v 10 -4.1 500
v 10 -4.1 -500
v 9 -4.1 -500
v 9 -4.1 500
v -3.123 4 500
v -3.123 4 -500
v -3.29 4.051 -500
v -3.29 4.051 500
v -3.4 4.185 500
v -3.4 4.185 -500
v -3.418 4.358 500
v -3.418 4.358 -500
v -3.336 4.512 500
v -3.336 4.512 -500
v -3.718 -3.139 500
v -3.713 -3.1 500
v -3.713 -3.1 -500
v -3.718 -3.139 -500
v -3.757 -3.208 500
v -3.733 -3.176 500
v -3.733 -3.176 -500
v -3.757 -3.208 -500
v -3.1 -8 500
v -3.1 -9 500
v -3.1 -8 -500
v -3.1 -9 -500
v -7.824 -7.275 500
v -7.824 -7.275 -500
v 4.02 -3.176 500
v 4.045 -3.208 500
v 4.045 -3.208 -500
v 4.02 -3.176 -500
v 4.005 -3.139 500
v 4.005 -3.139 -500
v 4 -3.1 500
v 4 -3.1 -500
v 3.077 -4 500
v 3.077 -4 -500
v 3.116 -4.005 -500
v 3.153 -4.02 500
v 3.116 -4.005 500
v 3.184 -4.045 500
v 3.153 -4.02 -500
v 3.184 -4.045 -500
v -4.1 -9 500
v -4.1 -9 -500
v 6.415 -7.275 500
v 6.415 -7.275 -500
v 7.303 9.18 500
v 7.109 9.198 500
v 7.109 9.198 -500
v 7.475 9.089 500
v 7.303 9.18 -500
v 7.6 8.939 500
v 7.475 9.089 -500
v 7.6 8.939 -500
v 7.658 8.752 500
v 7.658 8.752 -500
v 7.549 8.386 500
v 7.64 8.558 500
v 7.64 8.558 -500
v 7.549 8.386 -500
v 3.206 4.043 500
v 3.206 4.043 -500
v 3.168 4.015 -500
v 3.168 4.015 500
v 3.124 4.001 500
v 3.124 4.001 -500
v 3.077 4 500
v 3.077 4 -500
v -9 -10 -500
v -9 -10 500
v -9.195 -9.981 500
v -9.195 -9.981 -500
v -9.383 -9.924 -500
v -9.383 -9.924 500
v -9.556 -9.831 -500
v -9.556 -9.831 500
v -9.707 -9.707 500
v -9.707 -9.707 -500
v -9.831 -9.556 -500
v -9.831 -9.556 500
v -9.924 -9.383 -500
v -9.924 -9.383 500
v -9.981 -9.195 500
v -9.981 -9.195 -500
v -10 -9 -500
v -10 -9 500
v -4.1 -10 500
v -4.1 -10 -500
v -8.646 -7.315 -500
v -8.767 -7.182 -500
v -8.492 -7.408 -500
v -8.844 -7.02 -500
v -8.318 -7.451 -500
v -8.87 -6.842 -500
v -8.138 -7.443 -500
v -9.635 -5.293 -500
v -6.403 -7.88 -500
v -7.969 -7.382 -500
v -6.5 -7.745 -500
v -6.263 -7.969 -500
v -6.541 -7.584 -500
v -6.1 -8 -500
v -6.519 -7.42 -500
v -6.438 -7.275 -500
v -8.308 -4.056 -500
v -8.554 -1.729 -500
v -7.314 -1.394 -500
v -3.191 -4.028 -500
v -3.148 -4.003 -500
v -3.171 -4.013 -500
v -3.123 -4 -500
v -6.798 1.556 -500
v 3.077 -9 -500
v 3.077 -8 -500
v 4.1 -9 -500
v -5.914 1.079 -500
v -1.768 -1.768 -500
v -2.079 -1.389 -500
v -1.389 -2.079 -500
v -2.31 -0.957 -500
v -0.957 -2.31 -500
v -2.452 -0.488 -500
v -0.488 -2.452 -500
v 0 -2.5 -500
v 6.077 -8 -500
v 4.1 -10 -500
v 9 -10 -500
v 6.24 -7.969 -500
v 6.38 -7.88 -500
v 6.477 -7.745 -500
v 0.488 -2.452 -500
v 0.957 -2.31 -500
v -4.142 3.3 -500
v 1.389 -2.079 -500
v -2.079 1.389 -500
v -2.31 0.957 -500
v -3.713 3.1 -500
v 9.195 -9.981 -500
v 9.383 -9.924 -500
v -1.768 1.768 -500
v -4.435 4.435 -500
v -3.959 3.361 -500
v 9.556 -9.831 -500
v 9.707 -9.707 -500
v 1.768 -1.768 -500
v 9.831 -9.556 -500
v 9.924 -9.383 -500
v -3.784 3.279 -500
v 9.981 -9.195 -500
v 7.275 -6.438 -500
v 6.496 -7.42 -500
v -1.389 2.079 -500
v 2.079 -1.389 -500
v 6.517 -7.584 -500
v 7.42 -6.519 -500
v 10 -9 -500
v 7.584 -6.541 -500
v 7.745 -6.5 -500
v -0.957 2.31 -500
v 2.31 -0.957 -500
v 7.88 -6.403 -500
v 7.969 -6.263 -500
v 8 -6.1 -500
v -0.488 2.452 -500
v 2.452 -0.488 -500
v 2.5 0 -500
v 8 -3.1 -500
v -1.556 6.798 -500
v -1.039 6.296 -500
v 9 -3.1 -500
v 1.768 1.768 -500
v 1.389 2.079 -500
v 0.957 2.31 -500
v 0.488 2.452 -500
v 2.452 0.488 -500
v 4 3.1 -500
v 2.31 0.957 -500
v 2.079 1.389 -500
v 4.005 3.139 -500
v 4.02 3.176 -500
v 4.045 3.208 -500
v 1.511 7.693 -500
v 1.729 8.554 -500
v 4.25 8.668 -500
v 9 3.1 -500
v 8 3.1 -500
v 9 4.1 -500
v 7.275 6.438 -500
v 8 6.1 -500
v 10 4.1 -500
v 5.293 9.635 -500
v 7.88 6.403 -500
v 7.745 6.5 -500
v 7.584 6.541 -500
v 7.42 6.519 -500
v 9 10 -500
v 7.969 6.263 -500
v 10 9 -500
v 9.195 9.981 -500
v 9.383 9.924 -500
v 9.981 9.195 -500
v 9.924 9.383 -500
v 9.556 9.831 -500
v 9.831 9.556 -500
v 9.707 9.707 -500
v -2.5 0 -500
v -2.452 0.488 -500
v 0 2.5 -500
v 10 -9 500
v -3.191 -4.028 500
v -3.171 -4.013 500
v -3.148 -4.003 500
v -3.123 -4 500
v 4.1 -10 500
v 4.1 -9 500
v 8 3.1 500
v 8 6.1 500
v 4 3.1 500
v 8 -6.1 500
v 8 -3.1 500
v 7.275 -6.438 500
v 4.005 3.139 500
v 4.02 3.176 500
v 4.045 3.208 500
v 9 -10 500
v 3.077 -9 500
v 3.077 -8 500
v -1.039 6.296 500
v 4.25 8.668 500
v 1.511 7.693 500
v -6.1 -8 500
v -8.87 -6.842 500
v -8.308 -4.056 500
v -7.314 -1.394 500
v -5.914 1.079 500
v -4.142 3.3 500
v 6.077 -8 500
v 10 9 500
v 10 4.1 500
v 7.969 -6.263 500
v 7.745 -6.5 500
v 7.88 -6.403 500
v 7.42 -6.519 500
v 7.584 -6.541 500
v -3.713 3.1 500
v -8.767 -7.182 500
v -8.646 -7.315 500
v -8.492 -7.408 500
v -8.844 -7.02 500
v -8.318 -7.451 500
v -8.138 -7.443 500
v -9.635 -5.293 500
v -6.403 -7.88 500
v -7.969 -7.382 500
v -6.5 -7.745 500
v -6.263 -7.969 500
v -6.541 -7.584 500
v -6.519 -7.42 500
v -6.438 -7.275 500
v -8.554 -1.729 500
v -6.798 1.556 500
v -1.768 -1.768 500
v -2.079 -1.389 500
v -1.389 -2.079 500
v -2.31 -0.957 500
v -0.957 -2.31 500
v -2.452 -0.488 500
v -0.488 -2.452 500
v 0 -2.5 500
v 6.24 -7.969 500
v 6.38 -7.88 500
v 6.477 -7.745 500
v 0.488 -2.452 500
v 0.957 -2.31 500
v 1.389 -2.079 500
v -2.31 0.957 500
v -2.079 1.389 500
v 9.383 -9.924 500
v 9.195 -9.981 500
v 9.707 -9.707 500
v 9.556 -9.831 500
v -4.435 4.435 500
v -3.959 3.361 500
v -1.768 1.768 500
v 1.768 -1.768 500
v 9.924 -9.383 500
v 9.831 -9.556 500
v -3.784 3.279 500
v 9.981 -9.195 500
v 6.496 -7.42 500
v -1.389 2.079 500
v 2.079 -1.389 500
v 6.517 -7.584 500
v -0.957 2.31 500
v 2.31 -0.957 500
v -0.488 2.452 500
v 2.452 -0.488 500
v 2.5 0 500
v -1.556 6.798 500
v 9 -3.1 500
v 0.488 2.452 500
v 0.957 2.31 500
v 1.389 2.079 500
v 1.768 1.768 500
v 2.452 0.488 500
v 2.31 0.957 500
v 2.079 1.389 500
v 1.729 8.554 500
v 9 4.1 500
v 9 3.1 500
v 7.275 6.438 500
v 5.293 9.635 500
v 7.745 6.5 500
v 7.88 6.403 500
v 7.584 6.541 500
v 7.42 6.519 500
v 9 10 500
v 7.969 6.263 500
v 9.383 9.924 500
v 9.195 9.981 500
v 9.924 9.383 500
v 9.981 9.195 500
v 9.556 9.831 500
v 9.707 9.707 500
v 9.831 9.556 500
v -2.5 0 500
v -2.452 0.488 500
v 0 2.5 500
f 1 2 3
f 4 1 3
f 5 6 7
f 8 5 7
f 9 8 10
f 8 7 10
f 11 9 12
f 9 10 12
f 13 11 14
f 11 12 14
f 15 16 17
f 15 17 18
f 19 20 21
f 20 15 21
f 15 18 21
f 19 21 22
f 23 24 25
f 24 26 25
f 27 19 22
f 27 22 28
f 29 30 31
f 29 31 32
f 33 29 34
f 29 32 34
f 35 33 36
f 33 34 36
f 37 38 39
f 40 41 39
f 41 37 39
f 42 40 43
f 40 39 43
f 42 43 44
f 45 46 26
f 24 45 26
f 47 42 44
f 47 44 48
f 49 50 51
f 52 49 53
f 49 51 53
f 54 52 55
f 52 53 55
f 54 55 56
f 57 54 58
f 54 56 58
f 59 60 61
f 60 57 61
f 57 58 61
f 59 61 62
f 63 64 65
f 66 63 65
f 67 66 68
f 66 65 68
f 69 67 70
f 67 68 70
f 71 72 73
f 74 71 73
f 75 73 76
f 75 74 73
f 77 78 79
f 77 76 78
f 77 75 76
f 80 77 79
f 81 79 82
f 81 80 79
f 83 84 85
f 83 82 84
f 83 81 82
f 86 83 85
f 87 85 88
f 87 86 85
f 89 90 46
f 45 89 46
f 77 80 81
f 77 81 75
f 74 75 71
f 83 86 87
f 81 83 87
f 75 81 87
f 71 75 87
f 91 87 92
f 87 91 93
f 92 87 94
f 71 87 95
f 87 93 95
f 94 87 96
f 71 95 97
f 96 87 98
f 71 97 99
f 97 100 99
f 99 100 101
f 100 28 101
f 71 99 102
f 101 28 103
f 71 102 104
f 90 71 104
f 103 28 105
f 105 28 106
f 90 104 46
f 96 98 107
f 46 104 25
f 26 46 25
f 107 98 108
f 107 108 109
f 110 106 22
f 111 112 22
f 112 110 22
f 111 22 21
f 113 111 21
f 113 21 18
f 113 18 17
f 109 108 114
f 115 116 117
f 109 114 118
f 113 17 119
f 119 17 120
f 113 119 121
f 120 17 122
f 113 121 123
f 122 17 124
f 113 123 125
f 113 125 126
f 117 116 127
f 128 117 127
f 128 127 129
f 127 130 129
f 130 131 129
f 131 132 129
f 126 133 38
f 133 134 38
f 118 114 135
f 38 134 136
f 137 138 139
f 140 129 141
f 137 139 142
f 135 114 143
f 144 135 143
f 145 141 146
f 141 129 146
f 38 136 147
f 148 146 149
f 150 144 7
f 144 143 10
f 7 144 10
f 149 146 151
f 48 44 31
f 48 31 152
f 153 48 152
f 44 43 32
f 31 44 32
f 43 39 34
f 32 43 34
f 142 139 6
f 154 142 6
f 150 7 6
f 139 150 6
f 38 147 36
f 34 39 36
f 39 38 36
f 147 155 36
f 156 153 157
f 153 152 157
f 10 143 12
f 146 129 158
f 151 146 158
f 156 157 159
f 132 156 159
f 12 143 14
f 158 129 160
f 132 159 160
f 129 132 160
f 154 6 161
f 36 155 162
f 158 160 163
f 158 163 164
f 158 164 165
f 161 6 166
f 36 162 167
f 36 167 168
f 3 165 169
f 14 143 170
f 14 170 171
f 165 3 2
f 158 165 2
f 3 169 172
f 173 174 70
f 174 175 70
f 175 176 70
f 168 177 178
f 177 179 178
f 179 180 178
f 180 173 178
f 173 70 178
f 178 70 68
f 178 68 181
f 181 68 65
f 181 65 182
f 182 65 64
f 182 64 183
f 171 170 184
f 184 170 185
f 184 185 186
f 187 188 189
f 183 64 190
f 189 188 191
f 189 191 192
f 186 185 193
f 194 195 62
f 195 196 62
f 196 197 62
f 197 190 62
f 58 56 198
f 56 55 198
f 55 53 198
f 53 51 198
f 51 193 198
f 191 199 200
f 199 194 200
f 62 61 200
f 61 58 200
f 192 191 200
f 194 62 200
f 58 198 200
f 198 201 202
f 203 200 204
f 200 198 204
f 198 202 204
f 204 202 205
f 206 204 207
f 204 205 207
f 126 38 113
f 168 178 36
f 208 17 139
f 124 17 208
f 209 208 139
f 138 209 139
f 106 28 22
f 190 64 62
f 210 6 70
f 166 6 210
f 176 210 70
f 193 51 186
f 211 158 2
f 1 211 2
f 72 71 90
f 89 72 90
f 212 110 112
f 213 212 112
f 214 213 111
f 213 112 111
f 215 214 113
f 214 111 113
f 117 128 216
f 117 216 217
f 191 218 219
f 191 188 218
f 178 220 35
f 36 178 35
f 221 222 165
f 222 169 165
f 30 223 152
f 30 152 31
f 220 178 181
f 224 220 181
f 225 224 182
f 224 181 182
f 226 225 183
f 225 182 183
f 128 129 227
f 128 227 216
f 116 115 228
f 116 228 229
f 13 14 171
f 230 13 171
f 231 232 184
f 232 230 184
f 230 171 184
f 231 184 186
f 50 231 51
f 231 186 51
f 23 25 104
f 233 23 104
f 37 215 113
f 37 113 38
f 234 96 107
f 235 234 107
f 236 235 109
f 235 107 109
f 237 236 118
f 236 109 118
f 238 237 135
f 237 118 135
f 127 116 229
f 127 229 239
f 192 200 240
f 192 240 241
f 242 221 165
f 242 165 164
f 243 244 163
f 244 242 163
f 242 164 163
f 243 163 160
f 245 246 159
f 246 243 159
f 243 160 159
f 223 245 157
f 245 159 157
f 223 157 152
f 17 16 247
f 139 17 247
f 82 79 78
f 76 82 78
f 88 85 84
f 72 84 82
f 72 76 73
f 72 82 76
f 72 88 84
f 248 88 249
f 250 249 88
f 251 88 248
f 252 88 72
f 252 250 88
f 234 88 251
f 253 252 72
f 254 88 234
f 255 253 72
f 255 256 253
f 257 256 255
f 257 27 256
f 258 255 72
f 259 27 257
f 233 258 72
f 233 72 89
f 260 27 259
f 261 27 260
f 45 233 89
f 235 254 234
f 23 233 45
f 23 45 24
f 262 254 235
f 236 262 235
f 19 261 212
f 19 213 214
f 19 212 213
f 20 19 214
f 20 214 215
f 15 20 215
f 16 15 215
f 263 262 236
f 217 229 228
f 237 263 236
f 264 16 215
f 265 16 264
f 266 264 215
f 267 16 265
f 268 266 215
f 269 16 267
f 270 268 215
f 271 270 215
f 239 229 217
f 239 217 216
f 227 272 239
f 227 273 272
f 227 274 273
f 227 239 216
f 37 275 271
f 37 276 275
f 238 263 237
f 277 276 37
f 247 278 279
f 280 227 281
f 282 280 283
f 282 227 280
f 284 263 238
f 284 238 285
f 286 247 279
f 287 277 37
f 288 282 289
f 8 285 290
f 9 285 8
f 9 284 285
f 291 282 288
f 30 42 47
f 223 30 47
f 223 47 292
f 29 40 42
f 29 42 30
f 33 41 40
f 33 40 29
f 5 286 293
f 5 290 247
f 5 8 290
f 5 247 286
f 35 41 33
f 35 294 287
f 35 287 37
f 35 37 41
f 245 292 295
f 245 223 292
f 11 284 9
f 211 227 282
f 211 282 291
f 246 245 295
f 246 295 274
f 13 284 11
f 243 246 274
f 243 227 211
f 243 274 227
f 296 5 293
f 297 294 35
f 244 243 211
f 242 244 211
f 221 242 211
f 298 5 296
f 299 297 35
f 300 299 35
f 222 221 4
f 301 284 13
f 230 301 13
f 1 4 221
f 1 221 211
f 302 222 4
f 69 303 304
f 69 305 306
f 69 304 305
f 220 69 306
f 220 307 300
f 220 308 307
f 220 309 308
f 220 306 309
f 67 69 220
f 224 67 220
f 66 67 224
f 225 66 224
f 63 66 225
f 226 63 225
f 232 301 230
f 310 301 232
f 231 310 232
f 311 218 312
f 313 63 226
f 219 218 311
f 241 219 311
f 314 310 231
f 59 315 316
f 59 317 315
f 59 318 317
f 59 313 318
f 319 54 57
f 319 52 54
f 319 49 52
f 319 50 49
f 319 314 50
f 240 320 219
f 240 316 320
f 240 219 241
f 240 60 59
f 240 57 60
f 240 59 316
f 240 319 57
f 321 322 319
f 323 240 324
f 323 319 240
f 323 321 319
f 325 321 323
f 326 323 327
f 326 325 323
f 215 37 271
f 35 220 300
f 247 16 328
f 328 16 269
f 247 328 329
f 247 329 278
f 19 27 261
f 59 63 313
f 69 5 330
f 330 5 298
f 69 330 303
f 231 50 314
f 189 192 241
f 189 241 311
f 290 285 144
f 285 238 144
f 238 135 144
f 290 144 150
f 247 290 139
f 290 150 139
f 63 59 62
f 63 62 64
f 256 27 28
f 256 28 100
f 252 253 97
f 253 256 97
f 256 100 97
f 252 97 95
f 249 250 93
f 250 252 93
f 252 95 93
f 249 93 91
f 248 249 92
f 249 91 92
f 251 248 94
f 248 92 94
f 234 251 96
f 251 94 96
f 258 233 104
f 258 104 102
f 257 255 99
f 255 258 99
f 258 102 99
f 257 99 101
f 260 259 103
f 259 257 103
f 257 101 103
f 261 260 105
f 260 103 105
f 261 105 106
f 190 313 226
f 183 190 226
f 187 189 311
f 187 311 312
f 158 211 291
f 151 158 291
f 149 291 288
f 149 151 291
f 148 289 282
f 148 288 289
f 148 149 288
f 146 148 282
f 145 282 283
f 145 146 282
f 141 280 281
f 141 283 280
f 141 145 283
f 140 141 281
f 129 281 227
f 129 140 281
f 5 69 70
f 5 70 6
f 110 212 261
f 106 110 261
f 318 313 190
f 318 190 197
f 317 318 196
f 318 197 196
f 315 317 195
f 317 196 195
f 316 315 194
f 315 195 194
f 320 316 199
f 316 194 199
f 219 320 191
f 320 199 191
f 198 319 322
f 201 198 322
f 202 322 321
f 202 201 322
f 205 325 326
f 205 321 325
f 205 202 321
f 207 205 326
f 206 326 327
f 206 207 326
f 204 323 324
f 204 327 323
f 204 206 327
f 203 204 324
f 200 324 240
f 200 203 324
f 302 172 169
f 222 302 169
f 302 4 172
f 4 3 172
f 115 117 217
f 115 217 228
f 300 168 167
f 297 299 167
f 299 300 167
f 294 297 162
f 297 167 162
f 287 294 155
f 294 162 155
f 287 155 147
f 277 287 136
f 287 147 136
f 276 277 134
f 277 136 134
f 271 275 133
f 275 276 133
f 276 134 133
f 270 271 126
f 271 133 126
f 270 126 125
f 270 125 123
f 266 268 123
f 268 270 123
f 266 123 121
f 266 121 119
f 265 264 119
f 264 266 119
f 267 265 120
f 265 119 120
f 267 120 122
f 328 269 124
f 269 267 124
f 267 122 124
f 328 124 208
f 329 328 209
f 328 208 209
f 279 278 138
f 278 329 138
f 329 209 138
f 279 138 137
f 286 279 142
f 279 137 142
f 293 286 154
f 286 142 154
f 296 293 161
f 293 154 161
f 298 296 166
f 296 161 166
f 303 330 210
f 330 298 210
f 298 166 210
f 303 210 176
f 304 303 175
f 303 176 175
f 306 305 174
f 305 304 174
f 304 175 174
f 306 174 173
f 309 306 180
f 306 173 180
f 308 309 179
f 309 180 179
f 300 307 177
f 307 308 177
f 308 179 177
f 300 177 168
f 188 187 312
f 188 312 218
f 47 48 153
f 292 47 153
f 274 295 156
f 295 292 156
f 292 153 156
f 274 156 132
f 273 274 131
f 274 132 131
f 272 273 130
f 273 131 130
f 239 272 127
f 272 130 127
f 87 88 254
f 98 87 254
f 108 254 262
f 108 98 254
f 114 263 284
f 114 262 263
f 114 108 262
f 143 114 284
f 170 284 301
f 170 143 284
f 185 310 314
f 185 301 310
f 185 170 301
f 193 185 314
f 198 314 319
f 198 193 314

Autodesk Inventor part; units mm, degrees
ref_plane "YZ Plane" through (0, 0, 0) normal (1, 0, 0) x (0, 1, 0)
ref_plane "XZ Plane" through (0, 0, 0) normal (0, 1, 0) x (-1, 0, 0)
ref_plane "XY Plane" through (0, 0, 0) normal (0, 0, 1) x (1, 0, 0)
sketch "Esboço1" plane through (0, 0, 0) normal (0, 0, 1) x (1, 0, 0)
  line L0 (-10, 10) -> (10, 10) construction
  line L1 (10, 10) -> (10, -10) construction
  line L2 (10, -10) -> (-10, -10) construction
  line L3 (-10, -10) -> (-10, 10) construction
  line L4 (-10, 10) -> (10, -10) construction
  line L5 (10, 10) -> (-10, -10) construction
  circle A0 centre (0, 0) radius 2.5
  line L6 (10, 10) -> (1.7678, 1.7678) construction
  line L7 (1.7678, -1.7678) -> (10, -10) construction
  line L8 (-1.7678, -1.7678) -> (-10, -10) construction
  line L9 (-10, 10) -> (-1.7678, 1.7678) construction
  line L10 (4, 3.1) -> (4, -3.1) construction
  line L11 (-3.1, -5.0193) -> (3.1, -5.0193) construction
  line L12 (3.1, -5.0193) -> (10, -5.0193) construction
  line L13 (-3.1, -5.0193) -> (-10, -5.0193) construction
  line L14 (3.6312, 10) -> (10, 10) construction
  line L15 (3.6312, 10) -> (10, 10) construction
  line L16 (4, 3.1) -> (4, -3.1)
  line L17 (10, 9) -> (10, 4.1)
  line L18 (10, 4.1) -> (9, 4.1)
  line L19 (9, 4.1) -> (9, 3.1)
  line L20 (9, 3.1) -> (8, 3.1)
  line L21 (8, 3.1) -> (8, 6.1)
  arc A1 (8, 6.1) -> (7.275, 6.4381) centre (7.5586, 6.1) ccw
  line L22 (7.275, 6.4381) -> (4.0446, 3.2078)
  arc A2 (4.0446, 3.2078) -> (4, 3.1) centre (4.1524, 3.1) ccw
  line L23 (10, -9) -> (10, -4.1)
  line L24 (10, -4.1) -> (9, -4.1)
  line L25 (9, -4.1) -> (9, -3.1)
  line L26 (9, -3.1) -> (8, -3.1)
  line L27 (8, -3.1) -> (8, -6.1)
  arc A3 (7.275, -6.4381) -> (8, -6.1) centre (7.5586, -6.1) ccw
  arc A4 (4, -3.1) -> (4.0446, -3.2078) centre (4.1524, -3.1) ccw
  line L28 (7.275, -6.4381) -> (4.0446, -3.2078)
  arc A5 (9, -10) -> (10, -9) centre (9, -9) ccw
  arc A6 (10, 9) -> (9, 10) centre (9, 9) ccw
  line L29 (9, -10) -> (4.1, -10)
  line L30 (4.1, -10) -> (4.1, -9)
  line L31 (4.1, -9) -> (3.0767, -9)
  line L32 (3.0767, -9) -> (3.0767, -8)
  line L33 (3.0767, -8) -> (6.0767, -8)
  arc A7 (6.0767, -8) -> (6.4148, -7.275) centre (6.0767, -7.5586) ccw
  line L34 (-3.1233, -4) -> (3.0767, -4)
  arc A8 (3.1845, -4.0446) -> (3.0767, -4) centre (3.0767, -4.1524) ccw
  line L35 (3.1845, -4.0446) -> (6.4148, -7.275)
  arc A9 (-3.1233, -4) -> (-3.1913, -4.0281) centre (-3.1233, -4.0961) ccw
  line L36 (-9, -10) -> (-4.1, -10)
  line L37 (-4.1, -10) -> (-4.1, -9)
  line L38 (-4.1, -9) -> (-3.1, -9)
  line L39 (-3.1, -9) -> (-3.1, -8)
  line L40 (-3.1, -8) -> (-6.1, -8)
  arc A10 (-6.4381, -7.275) -> (-6.1, -8) centre (-6.1, -7.5586) ccw
  line L41 (-3.1913, -4.0281) -> (-6.4381, -7.275)
  arc A11 (-10, -9) -> (-9, -10) centre (-9, -9) ccw
  arc A12 (9, 10) -> (-10, -9) centre (9, -9) ccw
  line L42 (-3.7574, -3.2078) -> (-7.8245, -7.275)
  arc A13 (-3.7574, -3.2078) -> (-3.7127, -3.1) centre (-3.8651, -3.1) ccw
  line L43 (-3.7127, -3.1) -> (-3.7127, 3.1)
  line L44 (7.5486, 8.3855) -> (3.2062, 4.0431)
  arc A14 (-4.1418, 3.3001) -> (-8.8702, -6.8418) centre (9, -9) ccw
  arc A15 (-8.8702, -6.8418) -> (-7.8245, -7.275) centre (-8.2576, -6.8418) ccw
  arc A16 (-3.7127, 3.1) -> (-4.1418, 3.3001) centre (-3.9739, 3.1) ccw
  line L45 (3.0767, 4) -> (-3.1233, 4)
  arc A17 (3.0767, 4) -> (3.2062, 4.0431) centre (3.0984, 4.1509) ccw
  arc A18 (-3.3355, 4.5121) -> (-3.1233, 4) centre (-3.1233, 4.3) ccw
  arc A19 (7.1087, 9.1979) -> (-3.3355, 4.5121) centre (9, -9) ccw
  arc A20 (7.5486, 8.3855) -> (7.1087, 9.1979) centre (7.1604, 8.7006) ccw
  point P0 (4, 0)
  point P1 (4, 0)
  point P2 (8.5, 3.1)
  point P3 (7.7452, 6.5)
  point P4 (7.7452, -6.5)
  point P5 (9.7071, -9.7071)
  point P6 (9.7071, 9.7071)
  point P7 (-6.55, -10)
  point P8 (6.55, -10)
  point P9 (-4.435, 4.435)
  point P10 (-3.7127, 0)
  point P11 (-8.492, -7.4077)
  point P12 (-3.8635, 3.3367)
  point P13 (-0.0233, 4)
  point P14 (-0.0233, -4)
  point P15 (-3.4005, 4.1852)
  point P16 (7.6001, 8.9387)
  dimension "d0" = 20
  dimension "d1" = 20
  dimension "d3" = 5
  dimension "d34" = 1
  dimension "d35" = 1
  dimension "d36" = 2
  dimension "d37" = 130
  dimension "d38" = 6
  dimension "d39" = 6.9
  dimension "d41" = 4.9
  dimension "d42" = 4.9
  dimension "d47" = 45
  dimension "d49" = 3
  dimension "d51" = 13
  dimension "d52" = 4.9
  dimension "d56" = 90
  dimension "d57" = 1
  dimension "d58" = 3
  dimension "d59" = 130
  dimension "d62" = 45
  dimension "d63" = 1.2
  dimension "d64" = 45
  dimension "d65" = 4.9
  dimension "d66" = 1
  dimension "d67" = 1
  dimension "d68" = 1
  dimension "d70" = 3
  dimension "d71" = 130
  dimension "d73" = 90
  dimension "d74" = 19
  dimension "d75" = 6.2
  dimension "d80" = 45
  dimension "d94" = 18
  dimension "d96" = 135
  dimension "d98" = 130
  dimension "d99" = 10.7445
  dimension "d101" = 8
  dimension "d104" = 135
  dimension "d110" = 135
  dimension "d114" = 0.3
extrude "Extrusão1" add sketch "Esboço1" along normal mid plane 1000
properties part number "Ext_003" material "Aço galvanizado"
